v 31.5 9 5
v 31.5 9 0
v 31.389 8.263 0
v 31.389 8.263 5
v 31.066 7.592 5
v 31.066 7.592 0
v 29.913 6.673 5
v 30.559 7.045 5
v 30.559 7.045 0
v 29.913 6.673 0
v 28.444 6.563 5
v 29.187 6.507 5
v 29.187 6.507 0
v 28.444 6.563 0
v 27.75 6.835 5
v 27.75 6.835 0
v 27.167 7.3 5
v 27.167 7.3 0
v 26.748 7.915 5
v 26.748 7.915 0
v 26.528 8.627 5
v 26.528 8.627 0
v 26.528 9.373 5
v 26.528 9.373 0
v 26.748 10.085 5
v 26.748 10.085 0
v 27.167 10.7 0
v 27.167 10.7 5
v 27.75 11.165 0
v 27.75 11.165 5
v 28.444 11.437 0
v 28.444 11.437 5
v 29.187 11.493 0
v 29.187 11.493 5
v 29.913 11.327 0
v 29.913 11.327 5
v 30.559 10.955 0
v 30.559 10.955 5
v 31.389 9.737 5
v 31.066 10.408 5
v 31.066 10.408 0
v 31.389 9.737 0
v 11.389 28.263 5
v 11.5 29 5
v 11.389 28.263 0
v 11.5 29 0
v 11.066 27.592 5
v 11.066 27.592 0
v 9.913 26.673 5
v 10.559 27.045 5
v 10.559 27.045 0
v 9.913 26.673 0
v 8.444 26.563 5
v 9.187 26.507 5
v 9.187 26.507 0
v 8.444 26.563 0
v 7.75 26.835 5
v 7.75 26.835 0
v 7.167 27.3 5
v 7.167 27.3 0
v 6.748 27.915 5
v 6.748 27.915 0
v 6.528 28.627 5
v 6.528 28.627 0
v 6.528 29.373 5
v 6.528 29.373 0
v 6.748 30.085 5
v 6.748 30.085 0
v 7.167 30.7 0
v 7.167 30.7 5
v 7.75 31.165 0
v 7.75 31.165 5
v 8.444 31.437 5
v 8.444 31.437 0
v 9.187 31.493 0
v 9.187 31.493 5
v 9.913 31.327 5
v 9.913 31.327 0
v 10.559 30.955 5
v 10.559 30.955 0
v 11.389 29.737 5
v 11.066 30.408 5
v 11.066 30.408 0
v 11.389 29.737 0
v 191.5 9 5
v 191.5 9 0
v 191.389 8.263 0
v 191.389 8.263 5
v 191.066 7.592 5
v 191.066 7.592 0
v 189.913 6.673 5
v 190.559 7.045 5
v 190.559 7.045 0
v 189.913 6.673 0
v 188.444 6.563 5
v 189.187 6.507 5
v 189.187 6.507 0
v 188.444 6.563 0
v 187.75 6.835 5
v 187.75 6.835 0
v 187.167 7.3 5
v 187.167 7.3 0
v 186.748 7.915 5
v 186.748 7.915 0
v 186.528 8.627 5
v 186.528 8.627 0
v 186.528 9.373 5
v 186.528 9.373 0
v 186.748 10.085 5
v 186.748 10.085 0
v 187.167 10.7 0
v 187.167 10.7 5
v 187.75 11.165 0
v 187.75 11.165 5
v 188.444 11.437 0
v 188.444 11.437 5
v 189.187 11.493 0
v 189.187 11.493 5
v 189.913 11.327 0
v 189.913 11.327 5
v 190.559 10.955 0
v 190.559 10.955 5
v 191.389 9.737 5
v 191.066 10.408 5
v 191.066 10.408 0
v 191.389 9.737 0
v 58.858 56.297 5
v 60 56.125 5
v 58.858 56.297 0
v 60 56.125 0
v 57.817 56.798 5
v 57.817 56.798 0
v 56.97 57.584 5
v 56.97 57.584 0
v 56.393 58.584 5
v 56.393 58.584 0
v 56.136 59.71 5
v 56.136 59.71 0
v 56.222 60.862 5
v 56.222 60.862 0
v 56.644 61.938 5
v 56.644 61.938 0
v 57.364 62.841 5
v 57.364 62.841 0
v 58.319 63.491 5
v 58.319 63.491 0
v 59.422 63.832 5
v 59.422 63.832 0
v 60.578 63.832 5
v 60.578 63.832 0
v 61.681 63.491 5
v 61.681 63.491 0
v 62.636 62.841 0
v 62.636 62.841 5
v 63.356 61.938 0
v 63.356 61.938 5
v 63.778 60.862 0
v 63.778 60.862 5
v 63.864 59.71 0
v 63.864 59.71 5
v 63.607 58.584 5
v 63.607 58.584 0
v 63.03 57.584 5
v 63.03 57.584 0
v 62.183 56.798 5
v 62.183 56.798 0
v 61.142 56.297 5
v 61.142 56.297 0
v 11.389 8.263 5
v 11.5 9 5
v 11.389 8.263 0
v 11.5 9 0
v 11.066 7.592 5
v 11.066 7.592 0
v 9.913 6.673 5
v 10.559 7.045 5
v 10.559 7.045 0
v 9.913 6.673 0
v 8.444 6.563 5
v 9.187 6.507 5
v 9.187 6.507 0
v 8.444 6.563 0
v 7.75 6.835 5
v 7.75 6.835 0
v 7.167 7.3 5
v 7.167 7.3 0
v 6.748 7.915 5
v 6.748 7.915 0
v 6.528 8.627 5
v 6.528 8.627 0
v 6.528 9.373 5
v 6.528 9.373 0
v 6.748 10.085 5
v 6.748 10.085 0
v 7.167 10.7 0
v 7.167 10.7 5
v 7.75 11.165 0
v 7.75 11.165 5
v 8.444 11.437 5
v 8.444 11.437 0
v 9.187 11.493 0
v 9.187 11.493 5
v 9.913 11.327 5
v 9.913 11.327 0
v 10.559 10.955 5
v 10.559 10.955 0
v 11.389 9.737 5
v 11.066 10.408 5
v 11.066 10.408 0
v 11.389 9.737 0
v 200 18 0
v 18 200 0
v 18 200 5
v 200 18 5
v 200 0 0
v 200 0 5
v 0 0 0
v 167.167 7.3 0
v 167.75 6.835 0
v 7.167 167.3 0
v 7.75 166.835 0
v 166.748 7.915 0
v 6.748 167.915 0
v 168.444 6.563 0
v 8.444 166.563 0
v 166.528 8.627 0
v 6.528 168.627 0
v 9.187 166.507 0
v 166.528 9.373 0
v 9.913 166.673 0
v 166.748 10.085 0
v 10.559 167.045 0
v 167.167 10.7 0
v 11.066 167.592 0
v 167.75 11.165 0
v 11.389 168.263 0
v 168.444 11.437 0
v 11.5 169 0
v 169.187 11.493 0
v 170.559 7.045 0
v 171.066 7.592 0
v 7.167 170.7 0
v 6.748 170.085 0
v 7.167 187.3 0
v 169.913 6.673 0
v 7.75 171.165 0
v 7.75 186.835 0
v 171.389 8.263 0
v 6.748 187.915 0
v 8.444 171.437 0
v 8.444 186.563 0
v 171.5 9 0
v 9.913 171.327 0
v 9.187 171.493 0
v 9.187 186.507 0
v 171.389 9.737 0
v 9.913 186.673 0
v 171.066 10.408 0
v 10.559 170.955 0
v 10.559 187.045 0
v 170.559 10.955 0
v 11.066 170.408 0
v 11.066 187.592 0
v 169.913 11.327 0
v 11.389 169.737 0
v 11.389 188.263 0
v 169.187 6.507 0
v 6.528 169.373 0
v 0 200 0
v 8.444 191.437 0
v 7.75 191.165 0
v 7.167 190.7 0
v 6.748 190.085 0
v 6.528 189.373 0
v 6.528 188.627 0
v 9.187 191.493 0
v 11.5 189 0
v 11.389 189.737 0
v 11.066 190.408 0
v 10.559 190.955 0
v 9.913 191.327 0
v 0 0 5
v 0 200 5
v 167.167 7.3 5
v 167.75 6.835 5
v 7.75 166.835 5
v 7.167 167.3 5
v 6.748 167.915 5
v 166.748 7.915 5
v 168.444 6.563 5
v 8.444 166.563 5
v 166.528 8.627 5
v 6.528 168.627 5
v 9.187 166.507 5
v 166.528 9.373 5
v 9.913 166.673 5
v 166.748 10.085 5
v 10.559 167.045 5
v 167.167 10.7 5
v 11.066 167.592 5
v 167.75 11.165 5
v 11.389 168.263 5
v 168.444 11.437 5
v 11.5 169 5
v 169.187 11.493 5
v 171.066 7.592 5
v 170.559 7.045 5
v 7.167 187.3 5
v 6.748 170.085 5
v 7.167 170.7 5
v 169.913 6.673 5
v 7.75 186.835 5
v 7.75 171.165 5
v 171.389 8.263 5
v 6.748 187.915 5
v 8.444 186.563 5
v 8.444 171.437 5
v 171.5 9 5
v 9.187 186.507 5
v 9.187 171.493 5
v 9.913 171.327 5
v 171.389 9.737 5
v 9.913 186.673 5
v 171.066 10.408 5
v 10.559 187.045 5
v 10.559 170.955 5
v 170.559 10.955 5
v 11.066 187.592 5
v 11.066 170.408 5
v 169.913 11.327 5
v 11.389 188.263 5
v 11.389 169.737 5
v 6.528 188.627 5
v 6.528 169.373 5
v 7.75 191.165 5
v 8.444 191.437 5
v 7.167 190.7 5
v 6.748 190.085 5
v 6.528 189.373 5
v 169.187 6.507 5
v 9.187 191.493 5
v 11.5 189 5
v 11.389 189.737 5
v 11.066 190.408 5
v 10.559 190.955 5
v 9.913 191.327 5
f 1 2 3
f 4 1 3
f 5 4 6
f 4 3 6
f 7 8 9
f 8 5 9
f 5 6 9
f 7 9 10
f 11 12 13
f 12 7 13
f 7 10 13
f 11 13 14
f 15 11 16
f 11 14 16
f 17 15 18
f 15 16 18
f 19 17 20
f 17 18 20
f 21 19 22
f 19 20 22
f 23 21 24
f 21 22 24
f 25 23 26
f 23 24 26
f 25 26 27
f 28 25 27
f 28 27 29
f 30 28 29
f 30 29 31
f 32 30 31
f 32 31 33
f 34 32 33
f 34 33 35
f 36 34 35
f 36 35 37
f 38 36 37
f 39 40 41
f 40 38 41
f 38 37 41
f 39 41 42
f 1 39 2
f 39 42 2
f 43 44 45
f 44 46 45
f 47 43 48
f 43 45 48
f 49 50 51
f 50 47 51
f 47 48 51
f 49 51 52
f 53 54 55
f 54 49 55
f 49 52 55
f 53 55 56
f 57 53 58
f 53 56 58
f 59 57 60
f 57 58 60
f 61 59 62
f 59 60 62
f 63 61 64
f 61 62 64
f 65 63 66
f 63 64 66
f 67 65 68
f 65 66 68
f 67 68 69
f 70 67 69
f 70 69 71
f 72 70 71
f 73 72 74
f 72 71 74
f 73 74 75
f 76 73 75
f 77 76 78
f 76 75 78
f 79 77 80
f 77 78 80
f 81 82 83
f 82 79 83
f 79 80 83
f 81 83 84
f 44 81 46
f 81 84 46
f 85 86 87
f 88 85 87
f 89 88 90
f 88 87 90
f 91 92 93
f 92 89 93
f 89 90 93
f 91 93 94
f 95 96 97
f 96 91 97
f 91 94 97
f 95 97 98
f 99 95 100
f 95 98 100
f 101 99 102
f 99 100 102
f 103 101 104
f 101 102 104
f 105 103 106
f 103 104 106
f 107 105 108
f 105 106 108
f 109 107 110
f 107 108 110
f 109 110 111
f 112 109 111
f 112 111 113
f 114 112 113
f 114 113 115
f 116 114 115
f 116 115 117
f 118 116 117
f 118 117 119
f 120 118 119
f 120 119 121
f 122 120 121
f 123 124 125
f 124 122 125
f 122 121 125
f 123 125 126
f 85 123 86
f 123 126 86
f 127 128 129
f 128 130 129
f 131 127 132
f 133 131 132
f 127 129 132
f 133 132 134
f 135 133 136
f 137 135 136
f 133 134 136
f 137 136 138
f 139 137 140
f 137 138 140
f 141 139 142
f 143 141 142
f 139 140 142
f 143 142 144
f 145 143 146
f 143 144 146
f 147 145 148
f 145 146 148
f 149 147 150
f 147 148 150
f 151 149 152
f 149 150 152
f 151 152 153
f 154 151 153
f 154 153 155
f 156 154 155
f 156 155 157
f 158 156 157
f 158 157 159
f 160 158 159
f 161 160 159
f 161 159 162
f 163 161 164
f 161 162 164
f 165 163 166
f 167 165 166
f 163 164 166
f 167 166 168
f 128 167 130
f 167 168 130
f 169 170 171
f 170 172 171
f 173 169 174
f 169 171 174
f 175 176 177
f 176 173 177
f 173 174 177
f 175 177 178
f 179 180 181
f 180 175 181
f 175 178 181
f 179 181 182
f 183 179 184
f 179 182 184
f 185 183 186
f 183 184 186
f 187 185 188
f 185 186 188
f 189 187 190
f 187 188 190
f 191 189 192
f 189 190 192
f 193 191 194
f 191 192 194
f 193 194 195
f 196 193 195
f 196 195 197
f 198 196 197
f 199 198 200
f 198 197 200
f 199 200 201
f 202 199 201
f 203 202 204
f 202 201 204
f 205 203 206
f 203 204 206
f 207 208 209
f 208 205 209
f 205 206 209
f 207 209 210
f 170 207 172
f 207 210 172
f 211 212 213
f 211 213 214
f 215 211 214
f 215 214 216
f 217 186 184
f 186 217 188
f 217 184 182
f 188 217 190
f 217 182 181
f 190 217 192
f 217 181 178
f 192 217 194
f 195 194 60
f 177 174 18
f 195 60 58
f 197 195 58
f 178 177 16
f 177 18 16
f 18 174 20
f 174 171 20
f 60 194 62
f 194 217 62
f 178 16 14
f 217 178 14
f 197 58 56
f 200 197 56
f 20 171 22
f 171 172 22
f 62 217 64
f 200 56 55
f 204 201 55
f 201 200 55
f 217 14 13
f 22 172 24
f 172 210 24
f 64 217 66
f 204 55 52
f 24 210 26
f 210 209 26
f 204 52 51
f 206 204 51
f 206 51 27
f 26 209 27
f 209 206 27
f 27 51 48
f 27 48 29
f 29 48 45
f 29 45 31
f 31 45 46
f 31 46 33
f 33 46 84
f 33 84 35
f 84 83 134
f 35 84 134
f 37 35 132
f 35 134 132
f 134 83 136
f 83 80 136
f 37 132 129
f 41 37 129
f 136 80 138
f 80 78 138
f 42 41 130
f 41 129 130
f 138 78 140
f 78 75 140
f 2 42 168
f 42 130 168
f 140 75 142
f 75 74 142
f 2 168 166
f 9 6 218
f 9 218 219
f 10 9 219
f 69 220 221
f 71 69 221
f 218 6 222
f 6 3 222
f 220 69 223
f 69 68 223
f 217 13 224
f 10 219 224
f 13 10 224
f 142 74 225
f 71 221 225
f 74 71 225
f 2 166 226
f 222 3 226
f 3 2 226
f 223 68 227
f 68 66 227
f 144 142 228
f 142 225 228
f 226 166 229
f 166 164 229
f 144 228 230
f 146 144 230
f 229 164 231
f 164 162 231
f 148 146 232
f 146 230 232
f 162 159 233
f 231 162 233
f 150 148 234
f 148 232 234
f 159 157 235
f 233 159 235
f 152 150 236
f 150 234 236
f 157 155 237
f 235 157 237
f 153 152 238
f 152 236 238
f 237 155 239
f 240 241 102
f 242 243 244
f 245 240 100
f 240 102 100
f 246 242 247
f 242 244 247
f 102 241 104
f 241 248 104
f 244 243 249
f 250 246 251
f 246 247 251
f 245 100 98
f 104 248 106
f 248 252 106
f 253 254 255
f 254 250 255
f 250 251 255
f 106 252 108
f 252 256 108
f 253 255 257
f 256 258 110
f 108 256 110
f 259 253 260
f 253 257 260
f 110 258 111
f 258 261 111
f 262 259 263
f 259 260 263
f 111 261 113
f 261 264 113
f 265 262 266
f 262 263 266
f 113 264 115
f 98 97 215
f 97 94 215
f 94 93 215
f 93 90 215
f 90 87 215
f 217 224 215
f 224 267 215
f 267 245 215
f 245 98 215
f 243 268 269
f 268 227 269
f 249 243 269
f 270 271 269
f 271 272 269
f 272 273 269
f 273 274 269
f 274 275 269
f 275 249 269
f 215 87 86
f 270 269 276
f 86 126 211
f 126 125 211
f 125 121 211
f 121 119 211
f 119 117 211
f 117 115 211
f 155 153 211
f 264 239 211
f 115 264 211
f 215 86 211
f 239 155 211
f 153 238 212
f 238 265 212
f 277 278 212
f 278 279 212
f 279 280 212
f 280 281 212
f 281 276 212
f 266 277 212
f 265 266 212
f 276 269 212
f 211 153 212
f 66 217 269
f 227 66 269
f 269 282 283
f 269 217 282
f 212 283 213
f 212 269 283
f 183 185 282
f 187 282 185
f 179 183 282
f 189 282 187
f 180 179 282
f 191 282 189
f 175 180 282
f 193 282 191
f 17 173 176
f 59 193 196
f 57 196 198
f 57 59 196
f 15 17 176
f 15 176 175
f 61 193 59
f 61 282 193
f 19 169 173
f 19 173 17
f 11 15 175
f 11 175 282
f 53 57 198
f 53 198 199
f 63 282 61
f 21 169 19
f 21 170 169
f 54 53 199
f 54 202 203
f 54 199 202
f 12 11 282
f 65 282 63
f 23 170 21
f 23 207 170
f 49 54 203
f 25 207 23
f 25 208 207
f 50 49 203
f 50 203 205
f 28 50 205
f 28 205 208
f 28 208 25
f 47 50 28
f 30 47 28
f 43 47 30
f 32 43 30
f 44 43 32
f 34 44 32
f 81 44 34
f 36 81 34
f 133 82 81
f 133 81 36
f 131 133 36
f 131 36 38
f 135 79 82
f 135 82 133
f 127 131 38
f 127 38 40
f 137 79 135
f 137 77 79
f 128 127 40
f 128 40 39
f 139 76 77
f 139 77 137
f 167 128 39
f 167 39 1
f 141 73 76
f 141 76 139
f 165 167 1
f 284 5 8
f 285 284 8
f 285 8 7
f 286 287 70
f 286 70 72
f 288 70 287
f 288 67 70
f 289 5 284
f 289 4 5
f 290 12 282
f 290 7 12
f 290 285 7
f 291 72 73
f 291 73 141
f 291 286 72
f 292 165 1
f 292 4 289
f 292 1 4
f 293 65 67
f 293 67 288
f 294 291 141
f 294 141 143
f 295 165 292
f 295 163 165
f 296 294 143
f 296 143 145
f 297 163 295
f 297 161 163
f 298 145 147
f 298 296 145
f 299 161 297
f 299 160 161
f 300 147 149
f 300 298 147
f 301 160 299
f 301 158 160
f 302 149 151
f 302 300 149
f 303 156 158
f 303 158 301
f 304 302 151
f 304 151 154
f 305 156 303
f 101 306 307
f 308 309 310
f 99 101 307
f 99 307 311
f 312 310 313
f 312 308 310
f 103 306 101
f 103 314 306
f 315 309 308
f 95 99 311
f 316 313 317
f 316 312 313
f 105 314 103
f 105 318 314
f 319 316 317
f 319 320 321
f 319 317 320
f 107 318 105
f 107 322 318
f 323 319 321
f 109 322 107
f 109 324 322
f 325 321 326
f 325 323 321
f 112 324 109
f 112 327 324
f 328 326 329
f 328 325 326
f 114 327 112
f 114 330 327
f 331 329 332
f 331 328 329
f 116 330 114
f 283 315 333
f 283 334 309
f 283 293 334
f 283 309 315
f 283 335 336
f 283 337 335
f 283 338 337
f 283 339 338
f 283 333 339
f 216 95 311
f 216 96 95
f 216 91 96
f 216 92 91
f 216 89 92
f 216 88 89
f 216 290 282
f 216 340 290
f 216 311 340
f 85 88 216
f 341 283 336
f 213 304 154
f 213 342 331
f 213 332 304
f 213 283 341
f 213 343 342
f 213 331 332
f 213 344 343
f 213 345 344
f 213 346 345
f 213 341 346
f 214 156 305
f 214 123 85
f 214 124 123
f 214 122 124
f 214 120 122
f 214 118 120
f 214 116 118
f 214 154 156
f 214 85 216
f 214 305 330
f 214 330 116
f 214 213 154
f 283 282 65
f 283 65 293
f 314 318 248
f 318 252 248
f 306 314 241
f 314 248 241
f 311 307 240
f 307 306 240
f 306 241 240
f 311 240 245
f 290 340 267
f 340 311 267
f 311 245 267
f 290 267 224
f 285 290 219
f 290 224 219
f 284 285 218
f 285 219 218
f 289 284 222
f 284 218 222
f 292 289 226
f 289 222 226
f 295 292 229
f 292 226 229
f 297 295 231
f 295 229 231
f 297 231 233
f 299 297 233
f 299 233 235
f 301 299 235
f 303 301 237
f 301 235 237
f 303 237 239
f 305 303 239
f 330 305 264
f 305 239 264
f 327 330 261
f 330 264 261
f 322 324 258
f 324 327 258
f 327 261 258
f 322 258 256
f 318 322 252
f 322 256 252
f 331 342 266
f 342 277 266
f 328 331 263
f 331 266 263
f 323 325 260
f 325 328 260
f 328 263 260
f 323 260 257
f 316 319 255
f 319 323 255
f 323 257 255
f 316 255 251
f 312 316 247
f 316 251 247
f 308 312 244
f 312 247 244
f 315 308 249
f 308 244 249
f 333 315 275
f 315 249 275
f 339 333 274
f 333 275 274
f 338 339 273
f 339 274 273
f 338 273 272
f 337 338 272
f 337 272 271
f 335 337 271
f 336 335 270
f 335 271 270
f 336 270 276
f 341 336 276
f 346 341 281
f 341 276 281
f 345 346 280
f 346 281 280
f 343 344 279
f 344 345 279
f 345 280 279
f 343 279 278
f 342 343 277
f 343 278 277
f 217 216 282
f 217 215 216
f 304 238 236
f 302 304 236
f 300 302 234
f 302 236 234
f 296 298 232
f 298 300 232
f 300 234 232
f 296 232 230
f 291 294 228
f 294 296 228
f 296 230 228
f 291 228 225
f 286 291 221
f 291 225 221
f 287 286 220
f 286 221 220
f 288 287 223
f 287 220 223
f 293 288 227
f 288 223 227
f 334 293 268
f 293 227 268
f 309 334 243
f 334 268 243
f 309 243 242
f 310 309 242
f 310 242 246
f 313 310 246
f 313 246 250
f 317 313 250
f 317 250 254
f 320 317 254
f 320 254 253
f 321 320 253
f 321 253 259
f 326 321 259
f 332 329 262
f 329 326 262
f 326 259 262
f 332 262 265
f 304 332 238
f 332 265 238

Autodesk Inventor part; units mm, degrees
ref_plane "YZ Plane" through (0, 0, 0) normal (1, 0, 0) x (0, 1, 0)
ref_plane "XZ Plane" through (0, 0, 0) normal (0, 1, 0) x (-1, 0, 0)
ref_plane "XY Plane" through (0, 0, 0) normal (0, 0, 1) x (1, 0, 0)
sketch "Sketch1" plane through (0, 0, 0) normal (0, 0, 1) x (1, 0, 0)
  circle A0 centre (9, 9) radius 2.5
  line L0 (200, 18) -> (200, 0)
  line L1 (200, 0) -> (0, 0)
  line L2 (0, 0) -> (0, 200)
  line L3 (0, 200) -> (18, 200)
  line L4 (18, 200) -> (200, 18)
  circle A1 centre (29, 9) radius 2.5
  circle A2 centre (169, 9) radius 2.5
  circle A3 centre (189, 9) radius 2.5
  circle A4 centre (9, 29) radius 2.5
  circle A5 centre (9, 169) radius 2.5
  circle A6 centre (9, 189) radius 2.5
extrude "Extrusion1" add sketch "Sketch1" along normal blind 5
hole "Hole1" at (60, 60, 5) direction (0, 0, -1) diameter 7.75 end through all
properties part number "GUSSET_200MM"
